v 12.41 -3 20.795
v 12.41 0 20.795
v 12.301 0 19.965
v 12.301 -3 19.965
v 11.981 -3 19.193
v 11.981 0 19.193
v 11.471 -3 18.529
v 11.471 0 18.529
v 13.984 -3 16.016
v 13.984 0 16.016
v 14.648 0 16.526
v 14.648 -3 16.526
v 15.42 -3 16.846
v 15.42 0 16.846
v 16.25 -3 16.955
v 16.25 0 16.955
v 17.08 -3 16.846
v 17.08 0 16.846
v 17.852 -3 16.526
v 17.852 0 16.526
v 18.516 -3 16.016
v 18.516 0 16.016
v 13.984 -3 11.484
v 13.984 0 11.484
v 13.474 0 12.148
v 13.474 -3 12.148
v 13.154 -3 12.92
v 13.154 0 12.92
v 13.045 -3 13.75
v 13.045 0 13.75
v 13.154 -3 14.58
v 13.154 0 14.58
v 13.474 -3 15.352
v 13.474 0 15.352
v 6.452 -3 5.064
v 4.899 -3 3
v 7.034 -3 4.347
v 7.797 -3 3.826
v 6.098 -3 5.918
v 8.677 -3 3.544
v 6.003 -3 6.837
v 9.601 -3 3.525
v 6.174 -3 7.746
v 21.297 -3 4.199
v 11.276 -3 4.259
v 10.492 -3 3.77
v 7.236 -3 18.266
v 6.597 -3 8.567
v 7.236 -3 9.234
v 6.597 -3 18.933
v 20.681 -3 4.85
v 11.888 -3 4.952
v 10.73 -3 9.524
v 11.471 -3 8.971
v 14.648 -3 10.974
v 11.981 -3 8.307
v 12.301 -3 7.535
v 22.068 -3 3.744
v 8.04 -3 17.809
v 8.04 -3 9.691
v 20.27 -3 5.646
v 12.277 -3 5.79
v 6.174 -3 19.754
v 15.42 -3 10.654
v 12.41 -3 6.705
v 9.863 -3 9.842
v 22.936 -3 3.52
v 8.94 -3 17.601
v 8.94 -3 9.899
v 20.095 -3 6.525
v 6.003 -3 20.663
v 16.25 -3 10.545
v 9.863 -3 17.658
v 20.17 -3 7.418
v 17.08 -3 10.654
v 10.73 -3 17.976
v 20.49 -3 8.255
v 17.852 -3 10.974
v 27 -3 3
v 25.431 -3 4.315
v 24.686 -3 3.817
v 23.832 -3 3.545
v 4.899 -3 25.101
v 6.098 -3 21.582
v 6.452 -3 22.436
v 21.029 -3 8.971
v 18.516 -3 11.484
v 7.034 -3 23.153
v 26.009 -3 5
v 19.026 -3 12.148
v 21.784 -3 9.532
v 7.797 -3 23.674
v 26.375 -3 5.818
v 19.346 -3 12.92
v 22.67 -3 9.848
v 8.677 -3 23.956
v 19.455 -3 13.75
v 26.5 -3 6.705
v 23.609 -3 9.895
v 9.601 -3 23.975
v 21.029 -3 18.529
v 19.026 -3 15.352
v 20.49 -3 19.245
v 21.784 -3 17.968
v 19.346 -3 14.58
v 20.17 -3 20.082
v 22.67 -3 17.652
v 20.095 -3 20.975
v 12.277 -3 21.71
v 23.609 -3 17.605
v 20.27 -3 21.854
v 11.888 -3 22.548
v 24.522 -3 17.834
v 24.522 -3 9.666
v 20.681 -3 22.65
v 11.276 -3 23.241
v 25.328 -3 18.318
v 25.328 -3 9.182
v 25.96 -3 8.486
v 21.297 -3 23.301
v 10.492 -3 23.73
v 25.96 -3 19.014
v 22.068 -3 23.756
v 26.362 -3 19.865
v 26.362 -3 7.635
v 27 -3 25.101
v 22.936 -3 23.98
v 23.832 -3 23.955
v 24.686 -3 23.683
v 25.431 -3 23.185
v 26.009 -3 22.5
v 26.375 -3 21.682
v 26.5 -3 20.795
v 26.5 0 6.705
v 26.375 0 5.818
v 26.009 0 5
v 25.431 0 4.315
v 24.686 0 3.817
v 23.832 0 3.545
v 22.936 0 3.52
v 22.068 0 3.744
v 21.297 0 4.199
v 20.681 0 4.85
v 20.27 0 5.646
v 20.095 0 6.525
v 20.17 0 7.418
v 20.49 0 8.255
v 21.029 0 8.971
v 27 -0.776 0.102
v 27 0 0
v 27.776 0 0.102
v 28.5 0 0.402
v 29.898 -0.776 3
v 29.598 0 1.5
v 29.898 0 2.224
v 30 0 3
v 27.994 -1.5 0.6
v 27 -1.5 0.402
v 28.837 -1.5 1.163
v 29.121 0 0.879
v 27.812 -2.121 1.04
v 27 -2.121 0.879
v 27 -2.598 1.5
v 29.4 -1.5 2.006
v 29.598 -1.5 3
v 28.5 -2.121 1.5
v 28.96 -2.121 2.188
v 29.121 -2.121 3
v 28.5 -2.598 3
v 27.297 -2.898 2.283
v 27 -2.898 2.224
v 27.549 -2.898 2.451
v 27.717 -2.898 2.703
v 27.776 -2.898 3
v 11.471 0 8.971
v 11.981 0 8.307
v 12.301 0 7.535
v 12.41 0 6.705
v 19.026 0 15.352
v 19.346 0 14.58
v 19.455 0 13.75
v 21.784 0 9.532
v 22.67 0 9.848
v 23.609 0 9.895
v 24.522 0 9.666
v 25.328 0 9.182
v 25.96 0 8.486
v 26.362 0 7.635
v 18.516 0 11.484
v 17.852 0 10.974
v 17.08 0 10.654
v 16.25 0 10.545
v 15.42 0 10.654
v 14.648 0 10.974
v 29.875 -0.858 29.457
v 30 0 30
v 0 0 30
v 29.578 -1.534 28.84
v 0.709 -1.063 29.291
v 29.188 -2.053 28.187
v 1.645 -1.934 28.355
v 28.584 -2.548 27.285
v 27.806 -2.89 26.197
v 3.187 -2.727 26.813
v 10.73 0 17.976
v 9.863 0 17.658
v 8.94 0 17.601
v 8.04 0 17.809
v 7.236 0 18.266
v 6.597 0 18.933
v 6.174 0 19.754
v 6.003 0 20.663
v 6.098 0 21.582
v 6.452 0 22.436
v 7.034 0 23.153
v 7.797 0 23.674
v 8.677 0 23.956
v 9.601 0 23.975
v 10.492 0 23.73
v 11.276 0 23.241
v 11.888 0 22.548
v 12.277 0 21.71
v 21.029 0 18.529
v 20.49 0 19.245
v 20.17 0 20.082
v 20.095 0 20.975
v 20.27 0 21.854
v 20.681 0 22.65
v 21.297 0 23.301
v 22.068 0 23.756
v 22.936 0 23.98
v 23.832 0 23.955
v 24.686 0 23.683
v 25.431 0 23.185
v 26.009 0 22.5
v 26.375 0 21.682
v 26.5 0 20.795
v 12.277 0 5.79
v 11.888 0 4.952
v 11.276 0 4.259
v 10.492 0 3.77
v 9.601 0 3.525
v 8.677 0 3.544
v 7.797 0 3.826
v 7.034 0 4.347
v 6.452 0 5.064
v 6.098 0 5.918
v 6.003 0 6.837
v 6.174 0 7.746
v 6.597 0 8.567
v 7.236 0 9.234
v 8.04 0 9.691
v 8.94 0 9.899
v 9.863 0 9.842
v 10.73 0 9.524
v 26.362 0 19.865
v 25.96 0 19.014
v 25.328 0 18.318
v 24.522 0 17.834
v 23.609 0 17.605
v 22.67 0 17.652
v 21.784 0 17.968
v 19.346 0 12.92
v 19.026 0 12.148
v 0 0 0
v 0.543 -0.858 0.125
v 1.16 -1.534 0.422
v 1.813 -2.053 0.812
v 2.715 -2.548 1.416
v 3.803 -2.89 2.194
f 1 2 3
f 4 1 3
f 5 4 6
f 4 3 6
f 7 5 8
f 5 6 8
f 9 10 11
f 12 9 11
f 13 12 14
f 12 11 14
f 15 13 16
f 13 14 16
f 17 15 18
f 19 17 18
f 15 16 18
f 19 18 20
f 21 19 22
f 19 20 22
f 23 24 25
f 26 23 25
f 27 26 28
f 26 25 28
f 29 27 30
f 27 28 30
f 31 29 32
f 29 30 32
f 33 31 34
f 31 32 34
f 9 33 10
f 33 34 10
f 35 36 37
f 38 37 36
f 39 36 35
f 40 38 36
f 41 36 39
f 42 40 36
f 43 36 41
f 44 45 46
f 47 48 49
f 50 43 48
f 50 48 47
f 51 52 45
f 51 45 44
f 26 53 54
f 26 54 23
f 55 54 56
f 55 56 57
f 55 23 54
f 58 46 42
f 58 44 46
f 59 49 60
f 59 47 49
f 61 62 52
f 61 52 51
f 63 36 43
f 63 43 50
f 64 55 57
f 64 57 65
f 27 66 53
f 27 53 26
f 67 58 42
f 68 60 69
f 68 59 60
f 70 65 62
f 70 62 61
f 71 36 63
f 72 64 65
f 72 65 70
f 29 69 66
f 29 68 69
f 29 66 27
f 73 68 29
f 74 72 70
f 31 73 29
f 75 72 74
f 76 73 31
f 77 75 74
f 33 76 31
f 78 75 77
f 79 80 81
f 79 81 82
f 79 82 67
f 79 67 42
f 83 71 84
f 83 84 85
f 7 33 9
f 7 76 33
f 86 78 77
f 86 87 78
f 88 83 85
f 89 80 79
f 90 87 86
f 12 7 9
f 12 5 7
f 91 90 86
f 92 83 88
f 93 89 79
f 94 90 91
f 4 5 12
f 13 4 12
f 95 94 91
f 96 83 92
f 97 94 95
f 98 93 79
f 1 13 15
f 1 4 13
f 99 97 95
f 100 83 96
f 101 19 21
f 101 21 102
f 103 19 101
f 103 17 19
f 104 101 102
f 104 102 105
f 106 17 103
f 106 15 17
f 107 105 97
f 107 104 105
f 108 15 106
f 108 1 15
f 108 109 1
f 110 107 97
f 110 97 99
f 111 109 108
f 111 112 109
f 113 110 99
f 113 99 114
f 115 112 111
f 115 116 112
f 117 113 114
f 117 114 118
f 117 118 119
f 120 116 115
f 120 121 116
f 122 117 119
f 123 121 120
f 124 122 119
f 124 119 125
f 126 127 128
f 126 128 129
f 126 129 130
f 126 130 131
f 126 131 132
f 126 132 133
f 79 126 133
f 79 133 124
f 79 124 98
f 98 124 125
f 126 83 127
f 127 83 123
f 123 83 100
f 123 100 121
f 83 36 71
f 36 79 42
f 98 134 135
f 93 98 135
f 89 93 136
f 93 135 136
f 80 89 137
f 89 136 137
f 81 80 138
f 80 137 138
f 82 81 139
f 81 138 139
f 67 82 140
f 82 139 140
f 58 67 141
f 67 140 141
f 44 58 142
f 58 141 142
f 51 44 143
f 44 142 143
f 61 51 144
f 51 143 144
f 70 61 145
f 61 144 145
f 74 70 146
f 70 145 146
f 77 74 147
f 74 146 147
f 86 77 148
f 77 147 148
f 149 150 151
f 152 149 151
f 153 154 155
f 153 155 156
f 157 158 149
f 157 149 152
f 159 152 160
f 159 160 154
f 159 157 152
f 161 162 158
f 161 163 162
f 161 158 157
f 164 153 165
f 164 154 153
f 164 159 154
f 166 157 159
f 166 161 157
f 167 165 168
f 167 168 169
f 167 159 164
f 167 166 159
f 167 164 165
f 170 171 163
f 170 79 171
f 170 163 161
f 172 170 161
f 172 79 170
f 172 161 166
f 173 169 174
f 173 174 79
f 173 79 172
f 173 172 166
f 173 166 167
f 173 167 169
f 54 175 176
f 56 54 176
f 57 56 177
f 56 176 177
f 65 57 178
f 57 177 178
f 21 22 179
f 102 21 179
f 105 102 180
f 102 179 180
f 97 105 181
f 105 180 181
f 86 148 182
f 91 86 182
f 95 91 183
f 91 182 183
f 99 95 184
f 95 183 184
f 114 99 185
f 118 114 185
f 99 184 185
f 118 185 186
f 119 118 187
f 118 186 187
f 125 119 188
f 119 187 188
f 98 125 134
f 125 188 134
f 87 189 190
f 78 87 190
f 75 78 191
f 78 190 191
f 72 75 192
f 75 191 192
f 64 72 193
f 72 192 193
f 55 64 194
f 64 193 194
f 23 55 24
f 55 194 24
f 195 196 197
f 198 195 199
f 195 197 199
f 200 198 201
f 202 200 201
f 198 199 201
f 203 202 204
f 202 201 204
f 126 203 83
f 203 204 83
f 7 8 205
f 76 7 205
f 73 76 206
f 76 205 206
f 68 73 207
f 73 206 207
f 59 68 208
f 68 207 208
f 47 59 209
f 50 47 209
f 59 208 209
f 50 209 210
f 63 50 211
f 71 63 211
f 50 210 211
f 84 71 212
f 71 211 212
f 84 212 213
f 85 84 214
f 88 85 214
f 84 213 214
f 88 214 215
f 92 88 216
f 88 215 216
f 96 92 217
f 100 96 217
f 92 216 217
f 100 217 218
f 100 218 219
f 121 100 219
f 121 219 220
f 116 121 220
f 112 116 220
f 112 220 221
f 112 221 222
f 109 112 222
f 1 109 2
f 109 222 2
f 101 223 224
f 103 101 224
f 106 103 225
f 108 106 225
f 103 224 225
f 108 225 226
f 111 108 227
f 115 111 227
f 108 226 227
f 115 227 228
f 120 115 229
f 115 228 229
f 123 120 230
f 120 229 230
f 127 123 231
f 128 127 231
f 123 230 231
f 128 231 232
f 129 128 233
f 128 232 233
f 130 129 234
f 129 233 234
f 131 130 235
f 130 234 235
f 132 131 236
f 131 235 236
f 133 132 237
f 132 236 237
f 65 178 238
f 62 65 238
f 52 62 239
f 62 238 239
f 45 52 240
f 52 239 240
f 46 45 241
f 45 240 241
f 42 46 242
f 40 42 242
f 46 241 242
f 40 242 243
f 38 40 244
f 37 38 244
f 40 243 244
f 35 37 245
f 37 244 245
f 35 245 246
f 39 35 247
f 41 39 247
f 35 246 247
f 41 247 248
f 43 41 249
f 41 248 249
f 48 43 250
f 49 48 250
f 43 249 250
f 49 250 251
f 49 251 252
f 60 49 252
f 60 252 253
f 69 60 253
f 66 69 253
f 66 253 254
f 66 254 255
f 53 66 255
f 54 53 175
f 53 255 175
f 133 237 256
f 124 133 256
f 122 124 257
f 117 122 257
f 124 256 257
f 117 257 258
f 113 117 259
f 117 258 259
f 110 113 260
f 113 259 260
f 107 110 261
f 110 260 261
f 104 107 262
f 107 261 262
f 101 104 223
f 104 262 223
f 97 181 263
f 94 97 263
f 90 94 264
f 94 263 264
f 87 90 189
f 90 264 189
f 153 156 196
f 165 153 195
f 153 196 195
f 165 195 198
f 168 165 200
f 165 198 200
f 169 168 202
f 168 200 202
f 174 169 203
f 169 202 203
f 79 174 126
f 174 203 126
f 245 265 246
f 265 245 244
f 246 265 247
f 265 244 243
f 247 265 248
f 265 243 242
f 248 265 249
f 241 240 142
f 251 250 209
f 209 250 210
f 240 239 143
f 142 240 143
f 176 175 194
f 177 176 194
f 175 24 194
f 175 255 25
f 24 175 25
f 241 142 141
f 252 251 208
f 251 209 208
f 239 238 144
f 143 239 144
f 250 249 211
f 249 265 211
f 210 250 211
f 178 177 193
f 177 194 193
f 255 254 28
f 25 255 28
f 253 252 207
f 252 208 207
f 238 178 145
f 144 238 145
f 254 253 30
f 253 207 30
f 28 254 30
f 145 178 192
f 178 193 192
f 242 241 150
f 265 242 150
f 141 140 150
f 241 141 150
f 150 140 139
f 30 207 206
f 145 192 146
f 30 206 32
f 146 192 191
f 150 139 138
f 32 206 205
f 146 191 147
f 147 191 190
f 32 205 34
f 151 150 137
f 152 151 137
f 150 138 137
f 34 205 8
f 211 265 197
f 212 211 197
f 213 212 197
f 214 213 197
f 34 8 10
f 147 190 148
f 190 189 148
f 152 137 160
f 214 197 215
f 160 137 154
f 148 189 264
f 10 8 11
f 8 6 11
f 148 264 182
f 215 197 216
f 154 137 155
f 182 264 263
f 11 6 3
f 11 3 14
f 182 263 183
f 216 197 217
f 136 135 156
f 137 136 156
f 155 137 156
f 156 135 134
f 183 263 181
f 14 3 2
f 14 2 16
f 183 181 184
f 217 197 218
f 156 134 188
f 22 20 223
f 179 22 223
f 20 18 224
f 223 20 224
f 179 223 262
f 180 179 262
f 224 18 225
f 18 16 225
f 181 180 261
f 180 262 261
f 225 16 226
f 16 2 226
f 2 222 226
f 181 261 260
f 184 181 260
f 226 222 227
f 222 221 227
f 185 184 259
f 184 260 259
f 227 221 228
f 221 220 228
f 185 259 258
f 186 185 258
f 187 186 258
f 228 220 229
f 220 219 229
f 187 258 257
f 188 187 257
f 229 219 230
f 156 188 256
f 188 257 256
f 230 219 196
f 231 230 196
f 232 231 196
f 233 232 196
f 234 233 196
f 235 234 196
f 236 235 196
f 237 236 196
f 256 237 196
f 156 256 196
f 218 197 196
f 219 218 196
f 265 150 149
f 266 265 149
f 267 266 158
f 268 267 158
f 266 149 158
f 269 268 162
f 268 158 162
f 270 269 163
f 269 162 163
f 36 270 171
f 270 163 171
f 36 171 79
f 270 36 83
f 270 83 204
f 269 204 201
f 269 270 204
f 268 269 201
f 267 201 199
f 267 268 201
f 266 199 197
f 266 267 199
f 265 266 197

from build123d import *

# Parameters (mm, degrees)
F0_W        = 21.5
F0_H        = 21.5
F0_W_2      = 5.5
F0_H_2      = 5.5
F0_W_3      = 3
F0_H_3      = 3
F1_DEPTH    = 3
F2_R        = 2.99999
F3_T1_DEPTH = 51.4949074278
F4_T1_DEPTH = 46.5959279422


# Not quite as in the source:
# - a fillet or chamfer that OpenCascade refuses, or shapes differently, is made with other operations: its cross-section is extruded or revolved along the edge and cut away or added
# - a fillet or chamfer is up to 0.001 mm smaller than in the source, because OpenCascade refuses the exact size


with BuildPart() as f1:
    # F0 (on Front) → F1 (new body)
    with BuildSketch(Plane.XZ):
        with Locations((16.25, 13.75)):
            Rectangle(F0_W, F0_H)
        with BuildLine():
            ThreePointArc((11.4712772337, 8.9712772337), (12.1660339017, 7.9315004007), (12.41, 6.705))
            ThreePointArc((12.41, 6.705), (6.2439660983, 5.4784995993), (11.4712772337, 8.9712772337))
        make_face(mode=Mode.SUBTRACT)
        with BuildLine():
            ThreePointArc((26.5, 6.705), (22.0684995993, 3.7439660983), (21.0287227663, 8.9712772337))
            ThreePointArc((21.0287227663, 8.9712772337), (24.5215004007, 9.6660339017), (26.5, 6.705))
        make_face(mode=Mode.SUBTRACT)
        with BuildLine():
            ThreePointArc((18.5162772337, 11.4837227663), (16.25, 10.545), (13.9837227663, 11.4837227663))
            ThreePointArc((13.9837227663, 11.4837227663), (13.045, 13.75), (13.9837227663, 16.0162772337))
            ThreePointArc((13.9837227663, 16.0162772337), (16.25, 16.955), (18.5162772337, 16.0162772337))
            ThreePointArc((18.5162772337, 16.0162772337), (19.2110339017, 14.9765004007), (19.455, 13.75))
            ThreePointArc((19.455, 13.75), (19.2110339017, 12.5234995993), (18.5162772337, 11.4837227663))
        make_face(mode=Mode.SUBTRACT)
        with BuildLine():
            ThreePointArc((12.41, 20.795), (12.1660339017, 19.5684995993), (11.4712772337, 18.5287227663))
            ThreePointArc((11.4712772337, 18.5287227663), (6.2439660983, 22.0215004007), (12.41, 20.795))
        make_face(mode=Mode.SUBTRACT)
        with BuildLine():
            ThreePointArc((26.5, 20.795), (24.5215004007, 17.8339660983), (21.0287227663, 18.5287227663))
            ThreePointArc((21.0287227663, 18.5287227663), (22.0684995993, 23.7560339017), (26.5, 20.795))
        make_face(mode=Mode.SUBTRACT)
        with Locations((2.75, 13.75)):
            Rectangle(F0_W_2, F0_H)
        with Locations((2.75, 27.25)):
            Rectangle(F0_W_2, F0_H_2)
        with Locations((16.25, 27.25)):
            Rectangle(F0_W, F0_H_2)
        with Locations((28.5, 27.25)):
            Rectangle(F0_W_3, F0_H_2)
        with Locations((28.5, 13.75)):
            Rectangle(F0_W_3, F0_H)
        with BuildLine():
            Line((27, 3), (27, 0))
            ThreePointArc((27, 0), (29.1213203436, 0.8786796564), (30, 3))
            Line((30, 3), (27, 3))
        make_face()
        with Locations((16.25, 1.5)):
            Rectangle(F0_W, F0_H_3)
        with Locations((2.75, 1.5)):
            Rectangle(F0_W_2, F0_H_3)
    extrude(amount=F1_DEPTH)

    # F2 (radius 3 in the source; OpenCascade refuses exactly that, so slightly less here)
    f2_edges = [f1.edges().sort_by_distance(p)[0] for p in [
        (29.12132, -3, 0.87868),
        (13.5, -3, 0),
        (30, -3, 16.5),
    ]]
    fillet(f2_edges, radius=F2_R)

    # F3: fillet of radius 5.5 on 1 edges, made by hand

    # F3_s2 → F3_t1 (cut)
    with BuildSketch(Plane.XY.offset(-9.2474587139)):
        with BuildLine():
            ThreePointArc((4.8989794856, -3), (2.0266981623, -2.1904157598), (0, 0))
            Line((0, 0), (0, -3))
            Line((0, -3), (4.8989794856, -3))
        make_face()
    extrude(amount=F3_T1_DEPTH, mode=Mode.SUBTRACT)

    # F4: fillet of radius 5.5 on 1 edges, made by hand

    # F4_s2 → F4_t1 (cut)
    with BuildSketch(Plane.YZ.offset(-7.3484692283)):
        with BuildLine():
            ThreePointArc((0, 30), (-2.1904157598, 27.9733018377), (-3, 25.1010205144))
            Line((-3, 25.1010205144), (-3, 30))
            Line((-3, 30), (0, 30))
        make_face()
    extrude(amount=F4_T1_DEPTH, mode=Mode.SUBTRACT)


solid = f1.part
